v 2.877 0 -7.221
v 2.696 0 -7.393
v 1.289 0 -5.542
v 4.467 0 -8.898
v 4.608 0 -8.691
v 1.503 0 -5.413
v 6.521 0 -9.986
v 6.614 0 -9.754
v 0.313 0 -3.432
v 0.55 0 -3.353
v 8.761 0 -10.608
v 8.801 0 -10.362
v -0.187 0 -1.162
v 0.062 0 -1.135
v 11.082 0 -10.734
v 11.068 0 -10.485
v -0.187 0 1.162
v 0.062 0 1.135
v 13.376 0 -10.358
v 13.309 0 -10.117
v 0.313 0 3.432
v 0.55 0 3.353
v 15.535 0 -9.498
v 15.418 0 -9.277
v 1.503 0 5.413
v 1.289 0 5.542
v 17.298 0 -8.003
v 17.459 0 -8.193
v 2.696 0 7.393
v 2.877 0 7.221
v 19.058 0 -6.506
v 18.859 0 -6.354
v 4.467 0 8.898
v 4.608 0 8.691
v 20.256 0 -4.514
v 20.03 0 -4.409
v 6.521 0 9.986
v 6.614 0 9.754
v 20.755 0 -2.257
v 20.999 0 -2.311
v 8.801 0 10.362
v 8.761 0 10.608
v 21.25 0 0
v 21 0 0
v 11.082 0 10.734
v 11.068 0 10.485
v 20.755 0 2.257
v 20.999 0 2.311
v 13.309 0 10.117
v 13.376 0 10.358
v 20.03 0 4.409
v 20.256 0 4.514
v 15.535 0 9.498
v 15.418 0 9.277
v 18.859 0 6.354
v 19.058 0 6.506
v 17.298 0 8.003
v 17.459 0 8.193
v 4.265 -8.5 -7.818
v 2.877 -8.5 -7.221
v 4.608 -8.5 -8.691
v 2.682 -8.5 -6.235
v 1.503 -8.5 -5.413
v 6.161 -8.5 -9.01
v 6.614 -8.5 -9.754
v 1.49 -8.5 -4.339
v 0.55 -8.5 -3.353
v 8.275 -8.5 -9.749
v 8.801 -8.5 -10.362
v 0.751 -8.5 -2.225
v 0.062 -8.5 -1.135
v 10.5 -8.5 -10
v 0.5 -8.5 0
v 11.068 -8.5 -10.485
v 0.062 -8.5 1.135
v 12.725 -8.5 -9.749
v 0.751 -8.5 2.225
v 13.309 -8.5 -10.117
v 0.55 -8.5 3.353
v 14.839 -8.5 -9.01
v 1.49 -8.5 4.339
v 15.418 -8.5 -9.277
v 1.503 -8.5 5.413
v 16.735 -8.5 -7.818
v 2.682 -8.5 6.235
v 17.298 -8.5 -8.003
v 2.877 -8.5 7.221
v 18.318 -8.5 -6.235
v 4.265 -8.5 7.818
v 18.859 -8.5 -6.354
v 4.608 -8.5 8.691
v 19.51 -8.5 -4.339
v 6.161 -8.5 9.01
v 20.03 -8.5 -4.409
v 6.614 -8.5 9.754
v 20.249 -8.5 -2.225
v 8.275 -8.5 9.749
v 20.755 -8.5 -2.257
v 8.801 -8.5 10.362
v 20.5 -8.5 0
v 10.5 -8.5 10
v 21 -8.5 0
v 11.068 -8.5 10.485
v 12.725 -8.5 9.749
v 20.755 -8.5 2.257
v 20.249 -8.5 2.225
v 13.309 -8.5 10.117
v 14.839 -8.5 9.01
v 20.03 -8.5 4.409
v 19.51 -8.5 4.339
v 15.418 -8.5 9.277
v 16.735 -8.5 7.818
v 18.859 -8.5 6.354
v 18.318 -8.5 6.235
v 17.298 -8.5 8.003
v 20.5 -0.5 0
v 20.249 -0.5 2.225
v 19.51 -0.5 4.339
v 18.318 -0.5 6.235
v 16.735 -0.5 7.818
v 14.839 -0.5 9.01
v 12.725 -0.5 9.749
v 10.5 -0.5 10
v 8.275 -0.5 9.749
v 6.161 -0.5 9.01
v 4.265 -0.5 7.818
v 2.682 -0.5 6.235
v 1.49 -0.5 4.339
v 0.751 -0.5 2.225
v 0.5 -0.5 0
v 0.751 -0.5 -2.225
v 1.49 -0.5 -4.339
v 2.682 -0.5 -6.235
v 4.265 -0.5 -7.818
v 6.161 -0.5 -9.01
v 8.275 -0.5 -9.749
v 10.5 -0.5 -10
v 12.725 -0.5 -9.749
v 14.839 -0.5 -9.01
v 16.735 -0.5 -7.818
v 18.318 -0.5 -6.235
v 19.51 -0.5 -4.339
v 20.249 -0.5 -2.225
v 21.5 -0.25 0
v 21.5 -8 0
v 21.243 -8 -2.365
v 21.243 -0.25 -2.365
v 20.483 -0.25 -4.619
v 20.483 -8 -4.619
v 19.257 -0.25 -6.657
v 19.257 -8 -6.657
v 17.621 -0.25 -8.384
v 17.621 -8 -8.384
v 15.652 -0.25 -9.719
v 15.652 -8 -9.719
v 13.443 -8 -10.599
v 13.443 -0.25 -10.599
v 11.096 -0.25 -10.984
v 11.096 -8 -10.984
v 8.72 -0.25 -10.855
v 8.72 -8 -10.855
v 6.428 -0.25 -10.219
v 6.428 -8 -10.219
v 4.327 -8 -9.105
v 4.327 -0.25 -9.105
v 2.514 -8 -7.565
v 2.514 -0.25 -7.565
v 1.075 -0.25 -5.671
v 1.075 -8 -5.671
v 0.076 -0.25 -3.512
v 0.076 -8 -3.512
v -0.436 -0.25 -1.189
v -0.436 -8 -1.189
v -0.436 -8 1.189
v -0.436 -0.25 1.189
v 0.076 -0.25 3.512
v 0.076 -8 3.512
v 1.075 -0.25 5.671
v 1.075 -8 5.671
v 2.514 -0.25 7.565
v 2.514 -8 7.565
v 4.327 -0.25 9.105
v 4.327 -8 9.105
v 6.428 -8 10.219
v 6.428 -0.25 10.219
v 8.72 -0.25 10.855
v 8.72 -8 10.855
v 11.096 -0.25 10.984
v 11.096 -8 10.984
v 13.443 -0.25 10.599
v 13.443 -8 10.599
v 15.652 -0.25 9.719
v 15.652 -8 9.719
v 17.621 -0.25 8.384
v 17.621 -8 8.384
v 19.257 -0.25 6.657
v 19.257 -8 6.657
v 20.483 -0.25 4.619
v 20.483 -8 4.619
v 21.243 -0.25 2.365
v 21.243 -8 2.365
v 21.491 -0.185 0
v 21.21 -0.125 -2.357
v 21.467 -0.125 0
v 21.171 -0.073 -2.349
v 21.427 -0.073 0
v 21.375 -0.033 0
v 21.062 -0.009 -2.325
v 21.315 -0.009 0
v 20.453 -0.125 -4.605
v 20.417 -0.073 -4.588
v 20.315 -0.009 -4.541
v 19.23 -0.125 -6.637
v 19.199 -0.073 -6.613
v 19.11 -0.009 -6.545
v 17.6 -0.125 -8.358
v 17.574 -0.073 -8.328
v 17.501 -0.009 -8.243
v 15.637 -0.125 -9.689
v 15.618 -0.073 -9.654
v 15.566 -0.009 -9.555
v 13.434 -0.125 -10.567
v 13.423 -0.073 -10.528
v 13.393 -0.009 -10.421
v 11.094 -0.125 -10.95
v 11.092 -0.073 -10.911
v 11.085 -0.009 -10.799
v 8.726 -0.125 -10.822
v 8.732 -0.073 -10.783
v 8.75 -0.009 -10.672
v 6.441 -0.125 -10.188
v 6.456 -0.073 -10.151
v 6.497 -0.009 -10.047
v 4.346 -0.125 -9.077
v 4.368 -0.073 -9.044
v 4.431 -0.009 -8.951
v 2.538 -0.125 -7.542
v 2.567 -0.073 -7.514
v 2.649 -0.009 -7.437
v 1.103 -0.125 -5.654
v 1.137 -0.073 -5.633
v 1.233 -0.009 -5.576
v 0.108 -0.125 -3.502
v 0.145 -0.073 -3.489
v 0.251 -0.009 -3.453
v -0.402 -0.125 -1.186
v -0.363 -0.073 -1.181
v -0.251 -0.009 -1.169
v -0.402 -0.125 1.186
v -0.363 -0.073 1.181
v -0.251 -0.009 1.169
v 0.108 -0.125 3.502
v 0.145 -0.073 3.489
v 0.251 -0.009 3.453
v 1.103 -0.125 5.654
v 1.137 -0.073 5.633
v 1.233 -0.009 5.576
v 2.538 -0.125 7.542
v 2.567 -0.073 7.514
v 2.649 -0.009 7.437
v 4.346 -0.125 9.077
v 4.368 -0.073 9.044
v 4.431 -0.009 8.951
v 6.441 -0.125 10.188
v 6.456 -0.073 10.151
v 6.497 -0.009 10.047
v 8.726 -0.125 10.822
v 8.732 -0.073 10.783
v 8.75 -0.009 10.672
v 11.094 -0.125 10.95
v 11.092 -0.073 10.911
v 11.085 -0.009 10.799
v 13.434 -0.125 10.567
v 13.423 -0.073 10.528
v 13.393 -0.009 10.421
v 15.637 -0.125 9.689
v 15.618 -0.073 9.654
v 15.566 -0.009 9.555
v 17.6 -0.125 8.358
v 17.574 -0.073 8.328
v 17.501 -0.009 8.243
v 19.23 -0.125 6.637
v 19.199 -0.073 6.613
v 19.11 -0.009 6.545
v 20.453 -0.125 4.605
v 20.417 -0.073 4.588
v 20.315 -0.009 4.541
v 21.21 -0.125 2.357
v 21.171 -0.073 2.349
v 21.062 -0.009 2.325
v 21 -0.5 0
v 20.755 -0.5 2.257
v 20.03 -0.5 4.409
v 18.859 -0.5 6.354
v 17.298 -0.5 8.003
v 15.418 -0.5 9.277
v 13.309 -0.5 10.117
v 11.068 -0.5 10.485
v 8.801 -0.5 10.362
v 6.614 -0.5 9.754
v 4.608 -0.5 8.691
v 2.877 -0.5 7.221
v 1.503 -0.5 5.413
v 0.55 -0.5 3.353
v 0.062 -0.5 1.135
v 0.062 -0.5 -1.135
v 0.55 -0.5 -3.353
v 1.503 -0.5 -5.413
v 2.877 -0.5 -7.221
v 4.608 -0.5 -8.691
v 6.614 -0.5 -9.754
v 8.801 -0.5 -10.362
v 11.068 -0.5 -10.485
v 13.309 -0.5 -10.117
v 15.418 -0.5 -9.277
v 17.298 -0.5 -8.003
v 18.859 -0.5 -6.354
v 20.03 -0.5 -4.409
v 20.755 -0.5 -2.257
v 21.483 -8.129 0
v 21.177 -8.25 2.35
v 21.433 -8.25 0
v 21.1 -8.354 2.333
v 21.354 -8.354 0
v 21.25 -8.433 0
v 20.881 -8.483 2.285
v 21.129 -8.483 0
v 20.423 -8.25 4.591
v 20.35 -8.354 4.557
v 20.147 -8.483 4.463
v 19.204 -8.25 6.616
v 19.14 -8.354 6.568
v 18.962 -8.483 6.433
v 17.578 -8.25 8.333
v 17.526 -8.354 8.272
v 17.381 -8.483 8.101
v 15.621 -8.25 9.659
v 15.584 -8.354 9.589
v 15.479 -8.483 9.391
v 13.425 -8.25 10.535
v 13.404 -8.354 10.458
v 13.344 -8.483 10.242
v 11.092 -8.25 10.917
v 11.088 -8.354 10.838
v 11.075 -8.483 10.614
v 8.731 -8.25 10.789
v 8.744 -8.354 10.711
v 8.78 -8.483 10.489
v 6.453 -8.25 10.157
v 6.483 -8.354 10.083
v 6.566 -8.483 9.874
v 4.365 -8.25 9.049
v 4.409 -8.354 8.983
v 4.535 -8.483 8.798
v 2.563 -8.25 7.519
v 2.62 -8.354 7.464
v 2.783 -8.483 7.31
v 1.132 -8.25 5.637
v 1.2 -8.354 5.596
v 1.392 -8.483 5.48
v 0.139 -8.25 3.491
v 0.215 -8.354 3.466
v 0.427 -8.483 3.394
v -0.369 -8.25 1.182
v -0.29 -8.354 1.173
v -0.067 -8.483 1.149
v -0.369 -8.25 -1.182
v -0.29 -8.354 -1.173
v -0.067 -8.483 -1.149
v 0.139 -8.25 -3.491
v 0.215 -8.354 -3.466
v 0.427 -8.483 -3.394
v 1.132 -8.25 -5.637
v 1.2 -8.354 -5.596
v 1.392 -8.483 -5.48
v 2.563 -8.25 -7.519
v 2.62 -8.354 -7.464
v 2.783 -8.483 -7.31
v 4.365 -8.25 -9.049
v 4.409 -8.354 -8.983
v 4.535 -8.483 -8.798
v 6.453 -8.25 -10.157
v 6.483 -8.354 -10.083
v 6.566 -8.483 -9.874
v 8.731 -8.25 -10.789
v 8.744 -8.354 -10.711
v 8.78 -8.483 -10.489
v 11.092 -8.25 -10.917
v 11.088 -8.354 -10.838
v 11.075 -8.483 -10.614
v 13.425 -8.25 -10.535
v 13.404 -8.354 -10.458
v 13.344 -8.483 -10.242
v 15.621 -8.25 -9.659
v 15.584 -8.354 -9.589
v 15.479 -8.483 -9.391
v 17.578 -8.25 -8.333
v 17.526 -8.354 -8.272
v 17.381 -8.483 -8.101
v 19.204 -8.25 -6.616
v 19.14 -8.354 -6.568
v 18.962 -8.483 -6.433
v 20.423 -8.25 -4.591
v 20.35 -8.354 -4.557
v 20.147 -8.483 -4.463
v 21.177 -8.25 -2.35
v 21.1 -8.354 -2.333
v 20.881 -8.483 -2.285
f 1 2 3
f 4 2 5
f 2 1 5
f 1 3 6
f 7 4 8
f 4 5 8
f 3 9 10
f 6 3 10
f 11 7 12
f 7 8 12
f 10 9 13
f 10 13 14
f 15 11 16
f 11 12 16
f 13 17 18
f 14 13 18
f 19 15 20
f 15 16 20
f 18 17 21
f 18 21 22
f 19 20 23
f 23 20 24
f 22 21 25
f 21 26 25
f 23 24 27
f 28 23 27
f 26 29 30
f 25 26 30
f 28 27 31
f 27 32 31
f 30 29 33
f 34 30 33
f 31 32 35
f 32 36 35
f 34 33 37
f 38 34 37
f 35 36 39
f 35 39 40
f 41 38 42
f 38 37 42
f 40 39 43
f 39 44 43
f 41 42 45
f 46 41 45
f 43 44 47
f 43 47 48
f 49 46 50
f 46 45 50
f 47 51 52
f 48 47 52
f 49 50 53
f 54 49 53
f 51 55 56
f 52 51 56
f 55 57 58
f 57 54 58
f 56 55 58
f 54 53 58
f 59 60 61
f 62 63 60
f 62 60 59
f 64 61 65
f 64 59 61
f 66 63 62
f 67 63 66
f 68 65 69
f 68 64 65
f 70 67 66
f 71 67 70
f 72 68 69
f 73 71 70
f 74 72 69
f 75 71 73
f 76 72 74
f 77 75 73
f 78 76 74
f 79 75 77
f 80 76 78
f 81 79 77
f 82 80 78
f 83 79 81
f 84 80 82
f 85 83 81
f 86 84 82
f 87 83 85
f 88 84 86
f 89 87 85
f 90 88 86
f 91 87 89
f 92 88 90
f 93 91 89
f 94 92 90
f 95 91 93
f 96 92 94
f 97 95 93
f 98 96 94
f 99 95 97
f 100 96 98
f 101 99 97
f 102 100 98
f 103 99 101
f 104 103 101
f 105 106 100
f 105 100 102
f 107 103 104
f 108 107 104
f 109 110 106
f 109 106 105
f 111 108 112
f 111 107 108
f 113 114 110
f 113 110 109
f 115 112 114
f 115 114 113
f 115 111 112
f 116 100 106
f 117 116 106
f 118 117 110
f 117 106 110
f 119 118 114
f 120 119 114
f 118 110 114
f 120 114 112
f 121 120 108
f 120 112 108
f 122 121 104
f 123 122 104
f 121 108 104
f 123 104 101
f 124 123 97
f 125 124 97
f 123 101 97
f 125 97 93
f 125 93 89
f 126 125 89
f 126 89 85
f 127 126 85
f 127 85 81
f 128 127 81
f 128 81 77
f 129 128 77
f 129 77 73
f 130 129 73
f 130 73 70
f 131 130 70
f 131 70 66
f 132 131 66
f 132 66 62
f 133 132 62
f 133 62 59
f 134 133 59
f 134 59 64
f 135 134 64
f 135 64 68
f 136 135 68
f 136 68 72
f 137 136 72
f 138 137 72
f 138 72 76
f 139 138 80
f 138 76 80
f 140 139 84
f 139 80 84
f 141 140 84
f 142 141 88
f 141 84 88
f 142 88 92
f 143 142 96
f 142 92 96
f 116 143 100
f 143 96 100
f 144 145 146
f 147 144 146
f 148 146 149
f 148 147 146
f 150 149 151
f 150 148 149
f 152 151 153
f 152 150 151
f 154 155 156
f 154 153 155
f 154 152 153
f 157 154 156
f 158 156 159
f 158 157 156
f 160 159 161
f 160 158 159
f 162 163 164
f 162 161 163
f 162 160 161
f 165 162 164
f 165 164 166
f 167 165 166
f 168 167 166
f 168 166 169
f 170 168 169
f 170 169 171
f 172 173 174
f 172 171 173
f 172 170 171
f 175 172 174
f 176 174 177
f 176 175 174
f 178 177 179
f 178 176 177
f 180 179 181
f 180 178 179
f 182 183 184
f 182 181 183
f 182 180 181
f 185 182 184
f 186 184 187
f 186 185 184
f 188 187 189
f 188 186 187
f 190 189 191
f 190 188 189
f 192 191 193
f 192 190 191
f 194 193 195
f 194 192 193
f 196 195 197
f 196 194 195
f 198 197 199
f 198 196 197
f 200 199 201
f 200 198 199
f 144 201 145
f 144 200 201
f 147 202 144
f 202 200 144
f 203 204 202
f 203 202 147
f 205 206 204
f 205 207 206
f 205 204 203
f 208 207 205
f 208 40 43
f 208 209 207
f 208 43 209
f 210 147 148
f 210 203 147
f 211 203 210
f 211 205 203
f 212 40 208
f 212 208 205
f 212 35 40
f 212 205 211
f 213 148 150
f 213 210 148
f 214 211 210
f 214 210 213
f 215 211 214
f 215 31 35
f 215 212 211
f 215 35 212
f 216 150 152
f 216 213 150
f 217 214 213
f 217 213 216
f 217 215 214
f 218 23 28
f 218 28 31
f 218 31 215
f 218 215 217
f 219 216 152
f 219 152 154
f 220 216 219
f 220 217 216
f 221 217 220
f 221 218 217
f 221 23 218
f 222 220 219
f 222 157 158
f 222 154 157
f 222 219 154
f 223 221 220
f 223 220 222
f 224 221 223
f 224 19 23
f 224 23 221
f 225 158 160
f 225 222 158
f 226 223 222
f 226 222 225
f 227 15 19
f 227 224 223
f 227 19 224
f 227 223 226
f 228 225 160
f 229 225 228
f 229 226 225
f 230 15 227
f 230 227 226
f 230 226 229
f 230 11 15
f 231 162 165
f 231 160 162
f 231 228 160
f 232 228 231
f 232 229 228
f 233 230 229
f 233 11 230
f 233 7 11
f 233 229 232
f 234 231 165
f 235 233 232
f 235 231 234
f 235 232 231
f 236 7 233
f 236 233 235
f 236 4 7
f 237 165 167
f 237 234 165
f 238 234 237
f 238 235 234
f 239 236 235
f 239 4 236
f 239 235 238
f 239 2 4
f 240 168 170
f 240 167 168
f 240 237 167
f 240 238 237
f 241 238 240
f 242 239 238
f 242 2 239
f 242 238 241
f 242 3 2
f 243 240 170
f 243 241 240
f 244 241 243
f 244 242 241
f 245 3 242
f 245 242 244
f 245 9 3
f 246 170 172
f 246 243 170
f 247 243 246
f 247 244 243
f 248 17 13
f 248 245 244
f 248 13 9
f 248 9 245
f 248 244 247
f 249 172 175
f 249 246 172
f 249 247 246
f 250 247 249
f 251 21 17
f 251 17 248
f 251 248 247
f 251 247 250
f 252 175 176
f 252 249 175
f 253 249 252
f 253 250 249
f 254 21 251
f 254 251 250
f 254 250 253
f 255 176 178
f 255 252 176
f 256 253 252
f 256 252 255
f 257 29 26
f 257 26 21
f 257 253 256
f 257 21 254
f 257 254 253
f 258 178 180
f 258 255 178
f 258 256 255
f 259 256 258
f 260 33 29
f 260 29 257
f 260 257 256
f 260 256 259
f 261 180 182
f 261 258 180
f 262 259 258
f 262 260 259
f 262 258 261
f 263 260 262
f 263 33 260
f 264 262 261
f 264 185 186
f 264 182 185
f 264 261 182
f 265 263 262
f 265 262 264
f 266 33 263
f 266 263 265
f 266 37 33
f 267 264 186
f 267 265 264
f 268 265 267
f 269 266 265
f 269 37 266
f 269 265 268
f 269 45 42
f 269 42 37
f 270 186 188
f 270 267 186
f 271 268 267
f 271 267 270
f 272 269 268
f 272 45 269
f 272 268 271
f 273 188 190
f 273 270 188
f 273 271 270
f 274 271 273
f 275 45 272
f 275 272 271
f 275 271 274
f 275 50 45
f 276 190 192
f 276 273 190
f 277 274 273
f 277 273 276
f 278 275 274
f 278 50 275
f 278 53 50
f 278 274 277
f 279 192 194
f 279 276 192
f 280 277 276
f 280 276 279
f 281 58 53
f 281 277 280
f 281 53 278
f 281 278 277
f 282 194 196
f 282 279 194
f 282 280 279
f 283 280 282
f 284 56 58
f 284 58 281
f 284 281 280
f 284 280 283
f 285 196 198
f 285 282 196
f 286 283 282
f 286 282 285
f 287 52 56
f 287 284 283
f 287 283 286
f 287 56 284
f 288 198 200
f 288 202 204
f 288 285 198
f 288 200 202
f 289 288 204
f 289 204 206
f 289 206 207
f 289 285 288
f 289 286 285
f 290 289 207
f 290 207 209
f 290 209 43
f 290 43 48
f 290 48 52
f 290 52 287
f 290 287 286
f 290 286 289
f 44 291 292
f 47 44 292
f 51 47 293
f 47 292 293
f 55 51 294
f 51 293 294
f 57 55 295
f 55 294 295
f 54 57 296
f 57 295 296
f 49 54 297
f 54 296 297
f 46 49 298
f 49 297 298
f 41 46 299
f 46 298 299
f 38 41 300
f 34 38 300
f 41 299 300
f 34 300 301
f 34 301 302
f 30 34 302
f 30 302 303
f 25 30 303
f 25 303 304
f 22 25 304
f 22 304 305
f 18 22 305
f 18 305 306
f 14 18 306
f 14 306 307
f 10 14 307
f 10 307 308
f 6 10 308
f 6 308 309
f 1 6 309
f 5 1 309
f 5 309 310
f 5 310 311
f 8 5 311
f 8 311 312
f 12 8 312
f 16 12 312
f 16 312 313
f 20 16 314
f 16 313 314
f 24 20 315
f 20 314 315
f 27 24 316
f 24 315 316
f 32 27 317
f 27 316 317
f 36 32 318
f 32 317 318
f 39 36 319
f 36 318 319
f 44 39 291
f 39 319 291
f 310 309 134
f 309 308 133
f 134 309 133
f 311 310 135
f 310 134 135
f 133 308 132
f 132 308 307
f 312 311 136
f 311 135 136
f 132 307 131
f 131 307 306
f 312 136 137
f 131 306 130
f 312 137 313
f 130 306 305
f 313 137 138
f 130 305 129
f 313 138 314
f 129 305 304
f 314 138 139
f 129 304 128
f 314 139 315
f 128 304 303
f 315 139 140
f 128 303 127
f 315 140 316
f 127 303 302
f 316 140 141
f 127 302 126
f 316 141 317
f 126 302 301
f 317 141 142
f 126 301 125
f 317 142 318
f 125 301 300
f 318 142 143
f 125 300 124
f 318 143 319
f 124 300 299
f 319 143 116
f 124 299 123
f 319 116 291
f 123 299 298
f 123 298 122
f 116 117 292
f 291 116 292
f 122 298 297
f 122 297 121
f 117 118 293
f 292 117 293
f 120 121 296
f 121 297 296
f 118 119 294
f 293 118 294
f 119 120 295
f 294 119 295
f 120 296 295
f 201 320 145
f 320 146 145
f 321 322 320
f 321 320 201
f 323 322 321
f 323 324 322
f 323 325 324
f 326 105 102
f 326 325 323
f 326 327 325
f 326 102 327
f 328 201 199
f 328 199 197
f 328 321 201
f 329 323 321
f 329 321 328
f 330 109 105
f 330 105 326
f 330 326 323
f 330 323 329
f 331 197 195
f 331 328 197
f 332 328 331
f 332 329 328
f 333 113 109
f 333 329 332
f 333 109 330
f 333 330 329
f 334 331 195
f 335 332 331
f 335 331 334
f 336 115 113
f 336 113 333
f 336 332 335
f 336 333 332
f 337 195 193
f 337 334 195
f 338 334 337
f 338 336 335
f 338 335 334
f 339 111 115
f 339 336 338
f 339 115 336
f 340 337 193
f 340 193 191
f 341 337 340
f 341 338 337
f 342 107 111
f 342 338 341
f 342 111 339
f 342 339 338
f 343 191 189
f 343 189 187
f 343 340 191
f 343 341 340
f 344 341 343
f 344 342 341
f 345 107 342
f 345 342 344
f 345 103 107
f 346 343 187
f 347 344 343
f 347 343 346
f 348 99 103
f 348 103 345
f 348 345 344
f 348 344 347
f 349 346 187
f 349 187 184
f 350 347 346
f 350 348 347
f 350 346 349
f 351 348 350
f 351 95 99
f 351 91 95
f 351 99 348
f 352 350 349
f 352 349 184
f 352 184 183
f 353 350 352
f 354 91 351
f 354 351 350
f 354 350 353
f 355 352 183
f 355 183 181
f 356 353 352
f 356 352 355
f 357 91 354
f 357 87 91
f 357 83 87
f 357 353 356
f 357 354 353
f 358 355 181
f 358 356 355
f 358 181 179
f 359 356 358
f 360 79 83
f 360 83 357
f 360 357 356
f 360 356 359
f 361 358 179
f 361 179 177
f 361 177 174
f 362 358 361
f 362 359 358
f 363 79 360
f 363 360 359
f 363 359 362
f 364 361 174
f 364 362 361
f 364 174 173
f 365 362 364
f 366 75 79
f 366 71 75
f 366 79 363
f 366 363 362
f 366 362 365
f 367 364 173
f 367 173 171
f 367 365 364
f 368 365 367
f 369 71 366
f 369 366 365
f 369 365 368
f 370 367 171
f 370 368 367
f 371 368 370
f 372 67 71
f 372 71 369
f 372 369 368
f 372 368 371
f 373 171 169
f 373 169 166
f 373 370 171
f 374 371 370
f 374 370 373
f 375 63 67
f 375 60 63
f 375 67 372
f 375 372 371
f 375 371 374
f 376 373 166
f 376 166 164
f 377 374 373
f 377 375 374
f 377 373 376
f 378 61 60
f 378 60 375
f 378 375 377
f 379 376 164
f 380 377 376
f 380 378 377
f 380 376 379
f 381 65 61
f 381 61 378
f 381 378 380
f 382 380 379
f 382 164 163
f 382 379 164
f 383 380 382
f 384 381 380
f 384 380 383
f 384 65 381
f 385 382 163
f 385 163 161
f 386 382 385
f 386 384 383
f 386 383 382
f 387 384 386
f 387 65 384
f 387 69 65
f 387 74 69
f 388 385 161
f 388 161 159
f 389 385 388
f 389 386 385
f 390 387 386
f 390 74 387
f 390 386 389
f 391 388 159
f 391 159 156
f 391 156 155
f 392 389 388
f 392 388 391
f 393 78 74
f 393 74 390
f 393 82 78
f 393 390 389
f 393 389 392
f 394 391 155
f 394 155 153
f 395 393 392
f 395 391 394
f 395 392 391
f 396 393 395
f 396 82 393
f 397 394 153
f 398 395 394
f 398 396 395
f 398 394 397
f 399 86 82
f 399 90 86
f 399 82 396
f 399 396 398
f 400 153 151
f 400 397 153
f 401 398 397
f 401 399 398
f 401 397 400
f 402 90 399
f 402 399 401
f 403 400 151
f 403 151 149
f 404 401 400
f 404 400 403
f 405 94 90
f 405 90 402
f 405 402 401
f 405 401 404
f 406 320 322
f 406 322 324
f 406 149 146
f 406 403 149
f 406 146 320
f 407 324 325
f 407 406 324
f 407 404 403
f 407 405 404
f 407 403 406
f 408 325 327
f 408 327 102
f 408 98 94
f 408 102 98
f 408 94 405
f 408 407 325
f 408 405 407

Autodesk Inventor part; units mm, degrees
ref_plane "YZ Plane" through (0, 0, 0) normal (1, 0, 0) x (0, 1, 0)
ref_plane "XZ Plane" through (0, 0, 0) normal (0, 1, 0) x (-1, 0, 0)
ref_plane "XY Plane" through (0, 0, 0) normal (0, 0, 1) x (1, 0, 0)
sketch "Sketch1" plane through (0, 0, 0) normal (0, 0, 1) x (1, 0, 0)
  line L0 (10.5, 0) -> (21, 0) construction
  line L1 (10.5, 0) -> (21, 0) construction
  line L2 (21, 0) -> (21, -0.5)
  line L3 (21, -0.5) -> (20.5, -0.5)
  line L4 (20.5, -0.5) -> (20.5, -8.5)
  line L5 (20.5, -8.5) -> (21.5, -8.5)
  line L6 (21.5, -8.5) -> (21.5, 0)
  line L7 (21.5, 0) -> (21, 0)
  line L8 (10.5, 0) -> (10.5, -8) construction
  line L9 (10.5, 0) -> (18.5, 0) construction
  point P0 (0, 0)
  dimension "d1" = 0
  dimension "d2" = 0.5
  dimension "d3" = 90
  dimension "d4" = 0.5
  dimension "d5" = 270
  dimension "d6" = 8
  dimension "d7" = 1
  dimension "d8" = 8.5
  dimension "d9" = 8
  dimension "d10" = 90
  dimension "d11" = 10.5
revolve "Revolution1" add sketch "Sketch1" angle 360 about axis through (10.5, 0, 0) along (0, -1, 0)
fillet "Fillet1" radius 0.5 1 edges at (-0.5, -8.5, 0)
fillet "Fillet2" radius 0.25 1 edges at (-0.5, 0, 0)
properties part number "TIRE"
